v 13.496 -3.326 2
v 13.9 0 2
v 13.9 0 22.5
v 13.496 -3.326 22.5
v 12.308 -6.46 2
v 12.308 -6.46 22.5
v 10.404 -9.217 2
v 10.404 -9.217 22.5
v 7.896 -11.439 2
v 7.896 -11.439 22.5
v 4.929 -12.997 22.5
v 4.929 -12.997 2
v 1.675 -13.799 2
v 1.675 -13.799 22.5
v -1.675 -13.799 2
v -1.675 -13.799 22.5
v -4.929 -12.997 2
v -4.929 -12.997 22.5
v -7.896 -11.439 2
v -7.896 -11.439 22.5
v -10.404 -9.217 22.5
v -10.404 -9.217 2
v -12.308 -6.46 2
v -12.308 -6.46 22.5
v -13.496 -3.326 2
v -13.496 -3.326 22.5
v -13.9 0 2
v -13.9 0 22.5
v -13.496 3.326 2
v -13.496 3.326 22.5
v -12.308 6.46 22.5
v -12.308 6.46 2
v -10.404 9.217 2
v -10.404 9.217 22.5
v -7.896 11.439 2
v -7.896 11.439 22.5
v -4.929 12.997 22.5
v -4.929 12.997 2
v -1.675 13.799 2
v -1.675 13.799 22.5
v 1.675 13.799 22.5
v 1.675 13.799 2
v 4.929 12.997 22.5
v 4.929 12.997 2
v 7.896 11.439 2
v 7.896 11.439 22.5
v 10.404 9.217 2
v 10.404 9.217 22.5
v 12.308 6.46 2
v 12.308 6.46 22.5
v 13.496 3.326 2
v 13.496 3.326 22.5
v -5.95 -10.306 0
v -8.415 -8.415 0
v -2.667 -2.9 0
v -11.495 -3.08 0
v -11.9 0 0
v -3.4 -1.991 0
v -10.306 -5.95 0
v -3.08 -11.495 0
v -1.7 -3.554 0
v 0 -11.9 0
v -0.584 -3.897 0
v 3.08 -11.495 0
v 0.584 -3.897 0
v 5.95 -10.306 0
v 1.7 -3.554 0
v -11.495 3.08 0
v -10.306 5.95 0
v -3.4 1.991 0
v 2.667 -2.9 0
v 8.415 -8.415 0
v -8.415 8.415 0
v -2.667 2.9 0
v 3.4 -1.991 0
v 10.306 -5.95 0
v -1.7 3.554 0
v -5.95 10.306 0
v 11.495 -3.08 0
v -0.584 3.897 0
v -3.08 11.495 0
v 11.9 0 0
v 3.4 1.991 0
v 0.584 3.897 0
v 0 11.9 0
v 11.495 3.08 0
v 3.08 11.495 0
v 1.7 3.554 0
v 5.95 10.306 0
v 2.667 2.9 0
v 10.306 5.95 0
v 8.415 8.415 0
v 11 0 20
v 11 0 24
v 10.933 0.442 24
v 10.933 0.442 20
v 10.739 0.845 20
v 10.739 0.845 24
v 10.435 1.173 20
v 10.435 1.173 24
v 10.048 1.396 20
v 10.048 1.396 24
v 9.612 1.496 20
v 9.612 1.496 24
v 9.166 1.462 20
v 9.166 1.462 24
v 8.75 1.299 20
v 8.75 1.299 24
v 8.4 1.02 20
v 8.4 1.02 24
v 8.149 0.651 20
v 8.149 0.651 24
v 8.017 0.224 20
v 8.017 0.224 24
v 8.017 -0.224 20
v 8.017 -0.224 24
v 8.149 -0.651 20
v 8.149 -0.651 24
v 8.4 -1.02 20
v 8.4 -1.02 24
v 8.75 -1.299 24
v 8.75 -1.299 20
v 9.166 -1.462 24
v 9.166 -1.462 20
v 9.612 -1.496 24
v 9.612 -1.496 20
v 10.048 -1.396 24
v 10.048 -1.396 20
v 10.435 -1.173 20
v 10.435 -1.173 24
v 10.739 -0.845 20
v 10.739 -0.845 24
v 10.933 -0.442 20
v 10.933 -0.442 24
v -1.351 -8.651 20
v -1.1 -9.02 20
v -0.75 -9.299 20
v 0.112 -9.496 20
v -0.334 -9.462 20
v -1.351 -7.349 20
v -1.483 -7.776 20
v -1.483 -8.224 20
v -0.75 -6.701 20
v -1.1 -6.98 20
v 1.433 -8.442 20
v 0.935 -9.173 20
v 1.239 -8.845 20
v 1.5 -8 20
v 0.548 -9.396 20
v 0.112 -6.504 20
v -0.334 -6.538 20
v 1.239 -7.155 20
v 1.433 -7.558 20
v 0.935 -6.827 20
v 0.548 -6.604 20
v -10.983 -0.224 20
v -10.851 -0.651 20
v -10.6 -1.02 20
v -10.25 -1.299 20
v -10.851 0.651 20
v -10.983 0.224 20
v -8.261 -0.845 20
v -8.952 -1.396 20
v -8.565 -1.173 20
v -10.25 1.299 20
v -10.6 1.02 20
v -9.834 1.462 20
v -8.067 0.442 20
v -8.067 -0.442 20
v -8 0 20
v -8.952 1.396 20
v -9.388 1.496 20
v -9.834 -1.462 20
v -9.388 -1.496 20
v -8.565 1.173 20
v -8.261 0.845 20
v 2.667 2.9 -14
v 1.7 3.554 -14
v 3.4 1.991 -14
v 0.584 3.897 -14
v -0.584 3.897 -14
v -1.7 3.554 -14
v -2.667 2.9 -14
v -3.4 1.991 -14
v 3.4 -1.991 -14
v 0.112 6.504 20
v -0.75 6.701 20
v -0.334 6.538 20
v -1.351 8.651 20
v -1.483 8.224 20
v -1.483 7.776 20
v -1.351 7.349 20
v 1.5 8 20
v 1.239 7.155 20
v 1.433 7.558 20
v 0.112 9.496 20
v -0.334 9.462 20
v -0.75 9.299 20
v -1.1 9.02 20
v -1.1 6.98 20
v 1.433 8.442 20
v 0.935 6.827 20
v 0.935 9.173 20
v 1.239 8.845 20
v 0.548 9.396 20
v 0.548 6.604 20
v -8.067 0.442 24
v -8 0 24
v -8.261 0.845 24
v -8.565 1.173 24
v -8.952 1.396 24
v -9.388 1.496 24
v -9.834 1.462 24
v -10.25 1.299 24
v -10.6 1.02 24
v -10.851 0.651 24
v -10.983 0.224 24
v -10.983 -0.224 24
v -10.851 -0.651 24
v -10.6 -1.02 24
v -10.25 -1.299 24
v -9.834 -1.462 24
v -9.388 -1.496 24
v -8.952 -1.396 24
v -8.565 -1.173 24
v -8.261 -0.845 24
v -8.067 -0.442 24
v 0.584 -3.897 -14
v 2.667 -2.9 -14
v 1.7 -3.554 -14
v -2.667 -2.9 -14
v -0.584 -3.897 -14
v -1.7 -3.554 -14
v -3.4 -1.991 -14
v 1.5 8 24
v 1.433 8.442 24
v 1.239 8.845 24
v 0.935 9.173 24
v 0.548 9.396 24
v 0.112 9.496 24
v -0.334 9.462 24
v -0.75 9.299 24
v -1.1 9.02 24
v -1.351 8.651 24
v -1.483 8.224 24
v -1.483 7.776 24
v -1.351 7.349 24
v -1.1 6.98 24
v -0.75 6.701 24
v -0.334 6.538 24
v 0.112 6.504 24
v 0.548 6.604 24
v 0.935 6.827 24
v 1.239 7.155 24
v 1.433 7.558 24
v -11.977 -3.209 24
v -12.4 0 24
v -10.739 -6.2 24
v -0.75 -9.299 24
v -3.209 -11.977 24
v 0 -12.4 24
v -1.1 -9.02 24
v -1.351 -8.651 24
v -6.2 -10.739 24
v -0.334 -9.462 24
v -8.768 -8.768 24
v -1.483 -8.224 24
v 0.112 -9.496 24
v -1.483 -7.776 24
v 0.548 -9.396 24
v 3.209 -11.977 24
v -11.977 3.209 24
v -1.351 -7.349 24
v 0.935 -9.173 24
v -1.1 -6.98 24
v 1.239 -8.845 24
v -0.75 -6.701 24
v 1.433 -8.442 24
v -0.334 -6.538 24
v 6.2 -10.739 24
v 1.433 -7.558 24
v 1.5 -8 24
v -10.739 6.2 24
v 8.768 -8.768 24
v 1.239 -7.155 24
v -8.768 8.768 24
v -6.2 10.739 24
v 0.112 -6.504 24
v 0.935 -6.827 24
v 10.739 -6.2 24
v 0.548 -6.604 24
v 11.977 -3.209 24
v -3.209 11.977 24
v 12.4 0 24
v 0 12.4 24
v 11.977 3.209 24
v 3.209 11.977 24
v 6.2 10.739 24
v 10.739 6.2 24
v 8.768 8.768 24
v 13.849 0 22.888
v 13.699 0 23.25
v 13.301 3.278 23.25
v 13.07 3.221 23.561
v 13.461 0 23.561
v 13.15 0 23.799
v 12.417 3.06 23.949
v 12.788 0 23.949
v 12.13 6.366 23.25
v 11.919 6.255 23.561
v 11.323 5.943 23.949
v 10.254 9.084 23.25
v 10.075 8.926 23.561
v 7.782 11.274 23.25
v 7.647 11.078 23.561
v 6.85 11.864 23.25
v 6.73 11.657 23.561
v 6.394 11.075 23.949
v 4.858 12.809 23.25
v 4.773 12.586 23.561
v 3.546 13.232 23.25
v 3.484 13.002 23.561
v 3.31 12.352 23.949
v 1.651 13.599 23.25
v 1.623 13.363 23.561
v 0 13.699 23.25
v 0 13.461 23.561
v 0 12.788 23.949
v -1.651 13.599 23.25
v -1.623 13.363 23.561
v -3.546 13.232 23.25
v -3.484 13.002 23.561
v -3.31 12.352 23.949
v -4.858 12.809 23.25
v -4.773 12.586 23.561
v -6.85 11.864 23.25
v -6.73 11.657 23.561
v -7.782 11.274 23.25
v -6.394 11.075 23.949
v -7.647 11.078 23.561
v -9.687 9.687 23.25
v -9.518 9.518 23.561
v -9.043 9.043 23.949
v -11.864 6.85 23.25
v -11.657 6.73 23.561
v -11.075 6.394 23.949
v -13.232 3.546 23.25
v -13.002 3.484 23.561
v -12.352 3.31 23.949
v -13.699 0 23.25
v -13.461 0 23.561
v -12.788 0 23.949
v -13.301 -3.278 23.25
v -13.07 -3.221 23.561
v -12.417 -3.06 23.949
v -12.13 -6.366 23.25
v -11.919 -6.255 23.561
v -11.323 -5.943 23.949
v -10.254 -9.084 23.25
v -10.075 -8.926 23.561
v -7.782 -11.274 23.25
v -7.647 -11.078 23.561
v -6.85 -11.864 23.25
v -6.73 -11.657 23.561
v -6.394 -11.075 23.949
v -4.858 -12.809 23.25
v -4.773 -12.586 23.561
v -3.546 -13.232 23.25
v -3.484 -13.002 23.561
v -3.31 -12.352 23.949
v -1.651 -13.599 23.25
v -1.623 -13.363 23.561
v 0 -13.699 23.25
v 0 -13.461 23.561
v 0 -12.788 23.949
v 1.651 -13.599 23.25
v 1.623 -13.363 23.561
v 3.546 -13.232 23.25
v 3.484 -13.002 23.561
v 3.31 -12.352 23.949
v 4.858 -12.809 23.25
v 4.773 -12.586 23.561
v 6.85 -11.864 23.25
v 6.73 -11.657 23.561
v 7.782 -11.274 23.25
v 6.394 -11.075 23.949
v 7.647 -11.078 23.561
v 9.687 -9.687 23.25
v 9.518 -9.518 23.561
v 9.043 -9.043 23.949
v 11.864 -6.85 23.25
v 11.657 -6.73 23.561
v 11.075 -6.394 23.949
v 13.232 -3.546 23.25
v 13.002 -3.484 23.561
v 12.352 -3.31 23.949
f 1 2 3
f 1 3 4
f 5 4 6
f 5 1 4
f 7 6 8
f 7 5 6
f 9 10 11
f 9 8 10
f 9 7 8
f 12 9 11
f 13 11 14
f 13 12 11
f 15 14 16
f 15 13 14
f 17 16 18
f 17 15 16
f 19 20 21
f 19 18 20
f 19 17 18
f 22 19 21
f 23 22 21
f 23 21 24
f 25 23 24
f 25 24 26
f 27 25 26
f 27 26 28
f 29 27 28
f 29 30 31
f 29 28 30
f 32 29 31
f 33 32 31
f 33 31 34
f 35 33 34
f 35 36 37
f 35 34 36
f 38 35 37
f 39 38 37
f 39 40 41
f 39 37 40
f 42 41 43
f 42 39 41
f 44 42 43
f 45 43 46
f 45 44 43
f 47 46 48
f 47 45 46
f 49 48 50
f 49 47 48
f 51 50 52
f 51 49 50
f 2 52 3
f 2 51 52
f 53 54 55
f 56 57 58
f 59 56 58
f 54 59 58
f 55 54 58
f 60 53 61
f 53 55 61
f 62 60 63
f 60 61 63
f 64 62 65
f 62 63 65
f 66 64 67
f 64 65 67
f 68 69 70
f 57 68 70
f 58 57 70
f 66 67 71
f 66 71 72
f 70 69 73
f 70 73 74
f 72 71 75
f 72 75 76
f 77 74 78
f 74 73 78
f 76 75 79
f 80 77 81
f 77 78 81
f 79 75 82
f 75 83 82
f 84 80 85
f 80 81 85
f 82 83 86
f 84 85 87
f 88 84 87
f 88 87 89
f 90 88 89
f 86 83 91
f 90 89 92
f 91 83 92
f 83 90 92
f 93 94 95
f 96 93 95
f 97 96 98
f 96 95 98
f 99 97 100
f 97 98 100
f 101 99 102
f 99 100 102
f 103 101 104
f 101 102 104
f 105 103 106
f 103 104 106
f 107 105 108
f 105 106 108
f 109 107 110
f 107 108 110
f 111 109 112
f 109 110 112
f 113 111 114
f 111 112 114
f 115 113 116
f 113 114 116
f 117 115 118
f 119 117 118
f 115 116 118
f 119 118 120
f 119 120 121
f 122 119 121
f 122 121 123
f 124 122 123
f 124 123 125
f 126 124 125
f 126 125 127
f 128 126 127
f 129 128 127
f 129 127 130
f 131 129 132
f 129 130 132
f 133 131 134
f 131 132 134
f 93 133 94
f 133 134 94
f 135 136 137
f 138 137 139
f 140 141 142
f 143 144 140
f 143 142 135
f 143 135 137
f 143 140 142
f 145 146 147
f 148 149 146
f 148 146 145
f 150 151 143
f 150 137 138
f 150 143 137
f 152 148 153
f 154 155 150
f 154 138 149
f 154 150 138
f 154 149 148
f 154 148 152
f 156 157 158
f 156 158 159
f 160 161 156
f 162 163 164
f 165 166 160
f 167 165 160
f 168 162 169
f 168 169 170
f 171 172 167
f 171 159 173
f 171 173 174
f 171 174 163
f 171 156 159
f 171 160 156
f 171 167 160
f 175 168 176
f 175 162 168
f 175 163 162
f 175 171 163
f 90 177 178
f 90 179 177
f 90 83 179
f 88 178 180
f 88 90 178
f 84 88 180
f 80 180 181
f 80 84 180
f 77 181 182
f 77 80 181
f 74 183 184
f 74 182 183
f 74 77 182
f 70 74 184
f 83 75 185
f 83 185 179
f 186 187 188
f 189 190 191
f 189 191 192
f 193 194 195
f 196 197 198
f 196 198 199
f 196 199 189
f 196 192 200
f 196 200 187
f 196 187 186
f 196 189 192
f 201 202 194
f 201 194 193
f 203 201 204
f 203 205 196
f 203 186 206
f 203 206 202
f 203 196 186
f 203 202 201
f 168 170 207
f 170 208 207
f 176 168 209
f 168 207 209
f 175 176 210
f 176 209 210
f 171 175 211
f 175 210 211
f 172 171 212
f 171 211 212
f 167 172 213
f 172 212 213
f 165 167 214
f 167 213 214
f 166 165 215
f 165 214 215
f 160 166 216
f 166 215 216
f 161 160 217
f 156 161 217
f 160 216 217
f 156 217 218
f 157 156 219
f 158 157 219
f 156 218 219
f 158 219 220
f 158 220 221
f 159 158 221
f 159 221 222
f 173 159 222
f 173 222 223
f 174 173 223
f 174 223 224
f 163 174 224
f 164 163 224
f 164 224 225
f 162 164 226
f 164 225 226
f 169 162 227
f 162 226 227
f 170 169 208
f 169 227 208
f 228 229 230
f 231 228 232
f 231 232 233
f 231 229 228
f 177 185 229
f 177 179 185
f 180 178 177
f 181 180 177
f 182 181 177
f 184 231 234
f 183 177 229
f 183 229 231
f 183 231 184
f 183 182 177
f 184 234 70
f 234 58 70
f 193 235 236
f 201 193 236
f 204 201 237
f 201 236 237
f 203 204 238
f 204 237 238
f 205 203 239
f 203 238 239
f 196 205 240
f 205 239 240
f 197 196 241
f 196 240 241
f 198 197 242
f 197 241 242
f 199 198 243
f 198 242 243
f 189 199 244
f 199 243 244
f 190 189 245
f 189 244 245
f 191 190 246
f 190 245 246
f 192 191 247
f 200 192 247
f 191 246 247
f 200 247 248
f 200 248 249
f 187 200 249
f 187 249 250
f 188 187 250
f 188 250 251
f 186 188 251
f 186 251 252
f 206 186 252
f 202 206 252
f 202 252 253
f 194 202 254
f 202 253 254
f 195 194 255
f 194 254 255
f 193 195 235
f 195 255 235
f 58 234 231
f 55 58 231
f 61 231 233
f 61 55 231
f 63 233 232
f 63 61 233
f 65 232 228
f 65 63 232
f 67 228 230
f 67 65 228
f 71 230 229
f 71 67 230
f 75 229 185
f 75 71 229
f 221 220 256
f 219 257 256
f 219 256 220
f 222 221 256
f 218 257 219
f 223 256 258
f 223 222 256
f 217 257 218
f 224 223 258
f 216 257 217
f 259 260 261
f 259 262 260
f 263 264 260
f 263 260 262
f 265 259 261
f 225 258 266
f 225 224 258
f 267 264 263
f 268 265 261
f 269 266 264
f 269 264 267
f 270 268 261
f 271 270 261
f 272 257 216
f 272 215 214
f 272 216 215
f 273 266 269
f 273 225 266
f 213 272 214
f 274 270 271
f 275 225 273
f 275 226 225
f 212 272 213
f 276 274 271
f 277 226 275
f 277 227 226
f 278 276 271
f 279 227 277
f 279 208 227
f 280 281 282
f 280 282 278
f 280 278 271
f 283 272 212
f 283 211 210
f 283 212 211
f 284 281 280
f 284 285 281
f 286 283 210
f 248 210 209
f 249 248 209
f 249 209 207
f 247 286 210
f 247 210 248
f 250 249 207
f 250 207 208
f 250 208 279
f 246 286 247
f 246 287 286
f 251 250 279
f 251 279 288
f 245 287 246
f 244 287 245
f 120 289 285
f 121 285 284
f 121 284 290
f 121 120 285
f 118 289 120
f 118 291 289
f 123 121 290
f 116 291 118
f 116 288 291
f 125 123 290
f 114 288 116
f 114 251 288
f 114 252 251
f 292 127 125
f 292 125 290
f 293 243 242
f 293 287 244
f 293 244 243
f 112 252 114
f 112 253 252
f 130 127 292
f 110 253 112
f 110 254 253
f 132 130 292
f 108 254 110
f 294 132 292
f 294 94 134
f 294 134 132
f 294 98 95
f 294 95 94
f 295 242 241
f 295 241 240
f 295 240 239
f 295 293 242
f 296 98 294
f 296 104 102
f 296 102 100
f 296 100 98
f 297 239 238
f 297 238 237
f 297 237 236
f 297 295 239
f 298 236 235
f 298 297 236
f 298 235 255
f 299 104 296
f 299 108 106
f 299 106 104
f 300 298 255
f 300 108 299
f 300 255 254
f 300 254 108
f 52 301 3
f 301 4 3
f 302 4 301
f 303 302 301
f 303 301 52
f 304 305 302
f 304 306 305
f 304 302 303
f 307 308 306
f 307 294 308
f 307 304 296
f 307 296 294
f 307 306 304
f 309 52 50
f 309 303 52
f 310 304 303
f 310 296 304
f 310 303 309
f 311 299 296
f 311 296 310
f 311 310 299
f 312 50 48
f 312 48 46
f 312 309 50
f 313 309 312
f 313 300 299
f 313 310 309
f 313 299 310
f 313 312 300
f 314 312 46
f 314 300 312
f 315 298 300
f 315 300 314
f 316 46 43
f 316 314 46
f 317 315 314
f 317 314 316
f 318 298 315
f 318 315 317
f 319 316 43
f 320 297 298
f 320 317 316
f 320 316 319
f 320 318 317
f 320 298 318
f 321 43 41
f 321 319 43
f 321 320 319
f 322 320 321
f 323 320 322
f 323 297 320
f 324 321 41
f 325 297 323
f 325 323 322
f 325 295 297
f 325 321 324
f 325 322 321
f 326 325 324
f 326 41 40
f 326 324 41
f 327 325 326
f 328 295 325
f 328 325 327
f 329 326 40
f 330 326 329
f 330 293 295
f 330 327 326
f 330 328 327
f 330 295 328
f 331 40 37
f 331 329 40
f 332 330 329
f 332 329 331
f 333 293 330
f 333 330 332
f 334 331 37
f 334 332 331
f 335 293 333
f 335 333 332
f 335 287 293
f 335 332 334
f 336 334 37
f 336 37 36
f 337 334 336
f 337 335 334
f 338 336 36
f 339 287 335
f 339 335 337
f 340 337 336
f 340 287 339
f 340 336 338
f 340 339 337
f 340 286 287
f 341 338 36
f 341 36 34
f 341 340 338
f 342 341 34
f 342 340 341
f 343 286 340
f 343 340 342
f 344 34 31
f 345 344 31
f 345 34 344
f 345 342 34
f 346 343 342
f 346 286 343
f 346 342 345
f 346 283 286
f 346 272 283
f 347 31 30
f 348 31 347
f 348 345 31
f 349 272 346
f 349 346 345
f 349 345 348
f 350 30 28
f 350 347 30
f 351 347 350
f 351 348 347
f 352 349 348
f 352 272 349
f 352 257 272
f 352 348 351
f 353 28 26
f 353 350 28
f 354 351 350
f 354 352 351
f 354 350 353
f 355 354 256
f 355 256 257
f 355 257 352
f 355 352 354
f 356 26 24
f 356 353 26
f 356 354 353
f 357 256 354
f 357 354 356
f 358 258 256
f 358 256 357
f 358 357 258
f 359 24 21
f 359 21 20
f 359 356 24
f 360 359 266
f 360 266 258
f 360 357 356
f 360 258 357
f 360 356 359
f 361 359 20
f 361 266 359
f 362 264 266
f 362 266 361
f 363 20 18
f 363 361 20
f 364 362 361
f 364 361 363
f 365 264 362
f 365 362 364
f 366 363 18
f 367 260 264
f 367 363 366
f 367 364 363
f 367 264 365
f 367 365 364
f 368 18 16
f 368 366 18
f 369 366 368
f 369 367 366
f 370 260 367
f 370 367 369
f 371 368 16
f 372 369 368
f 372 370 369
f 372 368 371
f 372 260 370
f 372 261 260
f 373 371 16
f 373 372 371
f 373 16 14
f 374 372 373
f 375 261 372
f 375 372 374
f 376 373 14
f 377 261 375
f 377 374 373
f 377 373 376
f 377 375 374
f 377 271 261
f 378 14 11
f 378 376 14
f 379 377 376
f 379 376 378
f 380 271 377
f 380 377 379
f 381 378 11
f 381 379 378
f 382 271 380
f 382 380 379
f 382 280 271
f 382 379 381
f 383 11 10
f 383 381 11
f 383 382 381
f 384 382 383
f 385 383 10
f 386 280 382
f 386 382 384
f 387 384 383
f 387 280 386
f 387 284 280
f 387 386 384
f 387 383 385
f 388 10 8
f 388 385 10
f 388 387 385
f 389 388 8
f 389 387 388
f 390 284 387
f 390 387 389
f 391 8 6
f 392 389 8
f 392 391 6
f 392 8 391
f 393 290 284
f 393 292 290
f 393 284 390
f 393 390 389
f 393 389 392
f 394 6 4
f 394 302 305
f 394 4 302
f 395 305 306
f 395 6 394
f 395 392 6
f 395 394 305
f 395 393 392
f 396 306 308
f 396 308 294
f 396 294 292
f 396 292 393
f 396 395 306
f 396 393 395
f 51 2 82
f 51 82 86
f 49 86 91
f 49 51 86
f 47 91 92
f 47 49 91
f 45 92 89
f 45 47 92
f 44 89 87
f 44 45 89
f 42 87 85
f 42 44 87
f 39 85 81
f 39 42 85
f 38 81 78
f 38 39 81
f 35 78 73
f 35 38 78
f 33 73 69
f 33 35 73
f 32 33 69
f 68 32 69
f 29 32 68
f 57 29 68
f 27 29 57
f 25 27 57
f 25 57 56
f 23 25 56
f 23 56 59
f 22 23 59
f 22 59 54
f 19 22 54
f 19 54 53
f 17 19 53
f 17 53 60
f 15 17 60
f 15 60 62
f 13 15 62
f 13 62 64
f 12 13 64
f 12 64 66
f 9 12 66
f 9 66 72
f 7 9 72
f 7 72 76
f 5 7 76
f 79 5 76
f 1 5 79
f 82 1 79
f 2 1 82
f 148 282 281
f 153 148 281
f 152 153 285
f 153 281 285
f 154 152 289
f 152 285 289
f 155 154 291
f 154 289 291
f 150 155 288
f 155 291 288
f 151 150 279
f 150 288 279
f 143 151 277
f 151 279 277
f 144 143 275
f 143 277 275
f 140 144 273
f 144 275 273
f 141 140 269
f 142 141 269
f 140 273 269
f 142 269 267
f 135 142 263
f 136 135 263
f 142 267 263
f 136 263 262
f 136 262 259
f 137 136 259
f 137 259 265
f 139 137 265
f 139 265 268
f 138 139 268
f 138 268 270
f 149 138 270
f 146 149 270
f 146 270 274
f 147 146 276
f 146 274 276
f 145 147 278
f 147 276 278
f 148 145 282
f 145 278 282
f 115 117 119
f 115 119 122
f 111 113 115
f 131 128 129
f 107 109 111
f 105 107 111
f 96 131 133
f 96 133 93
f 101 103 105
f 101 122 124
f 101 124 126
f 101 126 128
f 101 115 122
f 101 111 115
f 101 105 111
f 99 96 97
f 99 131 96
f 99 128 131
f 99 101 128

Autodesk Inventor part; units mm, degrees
ref_plane "YZ Plane" through (0, 0, 0) normal (1, 0, 0) x (0, 1, 0)
ref_plane "XZ Plane" through (0, 0, 0) normal (0, 1, 0) x (-1, 0, 0)
ref_plane "XY Plane" through (0, 0, 0) normal (0, 0, 1) x (1, 0, 0)
sketch "Sketch1" plane through (0, 0, 0) normal (0, 0, 1) x (1, 0, 0)
  circle A0 centre (0, 0) radius 13.9
  dimension "d0" = 27.8
extrude "Extrusion1" add sketch "Sketch1" along normal blind 24
fillet "Fillet1" radius 1.5 1 edges at (-13.9, 0, 24)
chamfer "Chamfer1" distance 2 angle 45 1 edges at (-13.9, 0, 0)
sketch "Sketch2" plane through (0, 0, 0) normal (0, 0, -1) x (-1, 0, 0)
  circle A0 centre (0, 0) radius 11.9 construction
  circle A1 centre (0, 0) radius 3.94
  line L0 (0, 0) -> (0, -2.6934)
  line L1 (3.4, -1.9909) -> (3.4, 1.9909)
  line L2 (-3.4, -1.9909) -> (-3.4, 1.9909)
  point P0 (0, -1.3467)
  dimension "d7" = 7.88
  dimension "d8" = 6.8
extrude "Extrusion2" add sketch "Sketch2" along normal blind 14 contours L1 A1 L2
sketch "Sketch3" plane through (0, 0, 24) normal (0, 0, 1) x (1, 0, 0)
  circle A0 centre (0, 0) radius 12.4 construction
  line L0 (0, 0) -> (0, 10.8794)
  line L1 (0, 0) -> (9.5, 0)
  circle A1 centre (9.5, 0) radius 1.5
  circle A2 centre (0, 8) radius 1.5
  circle A3 centre (-9.5, 0) radius 1.5
  circle A4 centre (0, -8) radius 1.5
  dimension "d11" = 8
  dimension "d12" = 9.5
  dimension "d13" = 3
  dimension "d14" = 3
extrude "Extrusion3" cut sketch "Sketch3" against normal blind 4
thread "Thread1" size "M3x0.5" class "6H" standard "ANSI Metric M Profile" length 30
thread "Thread2" size "M3x0.5" class "6H" standard "ANSI Metric M Profile" length 30
thread "Thread3" size "M3x0.5" class "6H" standard "ANSI Metric M Profile" length 30
thread "Thread4" size "M3x0.5" class "6H" standard "ANSI Metric M Profile" length 30
properties part number "motor"
